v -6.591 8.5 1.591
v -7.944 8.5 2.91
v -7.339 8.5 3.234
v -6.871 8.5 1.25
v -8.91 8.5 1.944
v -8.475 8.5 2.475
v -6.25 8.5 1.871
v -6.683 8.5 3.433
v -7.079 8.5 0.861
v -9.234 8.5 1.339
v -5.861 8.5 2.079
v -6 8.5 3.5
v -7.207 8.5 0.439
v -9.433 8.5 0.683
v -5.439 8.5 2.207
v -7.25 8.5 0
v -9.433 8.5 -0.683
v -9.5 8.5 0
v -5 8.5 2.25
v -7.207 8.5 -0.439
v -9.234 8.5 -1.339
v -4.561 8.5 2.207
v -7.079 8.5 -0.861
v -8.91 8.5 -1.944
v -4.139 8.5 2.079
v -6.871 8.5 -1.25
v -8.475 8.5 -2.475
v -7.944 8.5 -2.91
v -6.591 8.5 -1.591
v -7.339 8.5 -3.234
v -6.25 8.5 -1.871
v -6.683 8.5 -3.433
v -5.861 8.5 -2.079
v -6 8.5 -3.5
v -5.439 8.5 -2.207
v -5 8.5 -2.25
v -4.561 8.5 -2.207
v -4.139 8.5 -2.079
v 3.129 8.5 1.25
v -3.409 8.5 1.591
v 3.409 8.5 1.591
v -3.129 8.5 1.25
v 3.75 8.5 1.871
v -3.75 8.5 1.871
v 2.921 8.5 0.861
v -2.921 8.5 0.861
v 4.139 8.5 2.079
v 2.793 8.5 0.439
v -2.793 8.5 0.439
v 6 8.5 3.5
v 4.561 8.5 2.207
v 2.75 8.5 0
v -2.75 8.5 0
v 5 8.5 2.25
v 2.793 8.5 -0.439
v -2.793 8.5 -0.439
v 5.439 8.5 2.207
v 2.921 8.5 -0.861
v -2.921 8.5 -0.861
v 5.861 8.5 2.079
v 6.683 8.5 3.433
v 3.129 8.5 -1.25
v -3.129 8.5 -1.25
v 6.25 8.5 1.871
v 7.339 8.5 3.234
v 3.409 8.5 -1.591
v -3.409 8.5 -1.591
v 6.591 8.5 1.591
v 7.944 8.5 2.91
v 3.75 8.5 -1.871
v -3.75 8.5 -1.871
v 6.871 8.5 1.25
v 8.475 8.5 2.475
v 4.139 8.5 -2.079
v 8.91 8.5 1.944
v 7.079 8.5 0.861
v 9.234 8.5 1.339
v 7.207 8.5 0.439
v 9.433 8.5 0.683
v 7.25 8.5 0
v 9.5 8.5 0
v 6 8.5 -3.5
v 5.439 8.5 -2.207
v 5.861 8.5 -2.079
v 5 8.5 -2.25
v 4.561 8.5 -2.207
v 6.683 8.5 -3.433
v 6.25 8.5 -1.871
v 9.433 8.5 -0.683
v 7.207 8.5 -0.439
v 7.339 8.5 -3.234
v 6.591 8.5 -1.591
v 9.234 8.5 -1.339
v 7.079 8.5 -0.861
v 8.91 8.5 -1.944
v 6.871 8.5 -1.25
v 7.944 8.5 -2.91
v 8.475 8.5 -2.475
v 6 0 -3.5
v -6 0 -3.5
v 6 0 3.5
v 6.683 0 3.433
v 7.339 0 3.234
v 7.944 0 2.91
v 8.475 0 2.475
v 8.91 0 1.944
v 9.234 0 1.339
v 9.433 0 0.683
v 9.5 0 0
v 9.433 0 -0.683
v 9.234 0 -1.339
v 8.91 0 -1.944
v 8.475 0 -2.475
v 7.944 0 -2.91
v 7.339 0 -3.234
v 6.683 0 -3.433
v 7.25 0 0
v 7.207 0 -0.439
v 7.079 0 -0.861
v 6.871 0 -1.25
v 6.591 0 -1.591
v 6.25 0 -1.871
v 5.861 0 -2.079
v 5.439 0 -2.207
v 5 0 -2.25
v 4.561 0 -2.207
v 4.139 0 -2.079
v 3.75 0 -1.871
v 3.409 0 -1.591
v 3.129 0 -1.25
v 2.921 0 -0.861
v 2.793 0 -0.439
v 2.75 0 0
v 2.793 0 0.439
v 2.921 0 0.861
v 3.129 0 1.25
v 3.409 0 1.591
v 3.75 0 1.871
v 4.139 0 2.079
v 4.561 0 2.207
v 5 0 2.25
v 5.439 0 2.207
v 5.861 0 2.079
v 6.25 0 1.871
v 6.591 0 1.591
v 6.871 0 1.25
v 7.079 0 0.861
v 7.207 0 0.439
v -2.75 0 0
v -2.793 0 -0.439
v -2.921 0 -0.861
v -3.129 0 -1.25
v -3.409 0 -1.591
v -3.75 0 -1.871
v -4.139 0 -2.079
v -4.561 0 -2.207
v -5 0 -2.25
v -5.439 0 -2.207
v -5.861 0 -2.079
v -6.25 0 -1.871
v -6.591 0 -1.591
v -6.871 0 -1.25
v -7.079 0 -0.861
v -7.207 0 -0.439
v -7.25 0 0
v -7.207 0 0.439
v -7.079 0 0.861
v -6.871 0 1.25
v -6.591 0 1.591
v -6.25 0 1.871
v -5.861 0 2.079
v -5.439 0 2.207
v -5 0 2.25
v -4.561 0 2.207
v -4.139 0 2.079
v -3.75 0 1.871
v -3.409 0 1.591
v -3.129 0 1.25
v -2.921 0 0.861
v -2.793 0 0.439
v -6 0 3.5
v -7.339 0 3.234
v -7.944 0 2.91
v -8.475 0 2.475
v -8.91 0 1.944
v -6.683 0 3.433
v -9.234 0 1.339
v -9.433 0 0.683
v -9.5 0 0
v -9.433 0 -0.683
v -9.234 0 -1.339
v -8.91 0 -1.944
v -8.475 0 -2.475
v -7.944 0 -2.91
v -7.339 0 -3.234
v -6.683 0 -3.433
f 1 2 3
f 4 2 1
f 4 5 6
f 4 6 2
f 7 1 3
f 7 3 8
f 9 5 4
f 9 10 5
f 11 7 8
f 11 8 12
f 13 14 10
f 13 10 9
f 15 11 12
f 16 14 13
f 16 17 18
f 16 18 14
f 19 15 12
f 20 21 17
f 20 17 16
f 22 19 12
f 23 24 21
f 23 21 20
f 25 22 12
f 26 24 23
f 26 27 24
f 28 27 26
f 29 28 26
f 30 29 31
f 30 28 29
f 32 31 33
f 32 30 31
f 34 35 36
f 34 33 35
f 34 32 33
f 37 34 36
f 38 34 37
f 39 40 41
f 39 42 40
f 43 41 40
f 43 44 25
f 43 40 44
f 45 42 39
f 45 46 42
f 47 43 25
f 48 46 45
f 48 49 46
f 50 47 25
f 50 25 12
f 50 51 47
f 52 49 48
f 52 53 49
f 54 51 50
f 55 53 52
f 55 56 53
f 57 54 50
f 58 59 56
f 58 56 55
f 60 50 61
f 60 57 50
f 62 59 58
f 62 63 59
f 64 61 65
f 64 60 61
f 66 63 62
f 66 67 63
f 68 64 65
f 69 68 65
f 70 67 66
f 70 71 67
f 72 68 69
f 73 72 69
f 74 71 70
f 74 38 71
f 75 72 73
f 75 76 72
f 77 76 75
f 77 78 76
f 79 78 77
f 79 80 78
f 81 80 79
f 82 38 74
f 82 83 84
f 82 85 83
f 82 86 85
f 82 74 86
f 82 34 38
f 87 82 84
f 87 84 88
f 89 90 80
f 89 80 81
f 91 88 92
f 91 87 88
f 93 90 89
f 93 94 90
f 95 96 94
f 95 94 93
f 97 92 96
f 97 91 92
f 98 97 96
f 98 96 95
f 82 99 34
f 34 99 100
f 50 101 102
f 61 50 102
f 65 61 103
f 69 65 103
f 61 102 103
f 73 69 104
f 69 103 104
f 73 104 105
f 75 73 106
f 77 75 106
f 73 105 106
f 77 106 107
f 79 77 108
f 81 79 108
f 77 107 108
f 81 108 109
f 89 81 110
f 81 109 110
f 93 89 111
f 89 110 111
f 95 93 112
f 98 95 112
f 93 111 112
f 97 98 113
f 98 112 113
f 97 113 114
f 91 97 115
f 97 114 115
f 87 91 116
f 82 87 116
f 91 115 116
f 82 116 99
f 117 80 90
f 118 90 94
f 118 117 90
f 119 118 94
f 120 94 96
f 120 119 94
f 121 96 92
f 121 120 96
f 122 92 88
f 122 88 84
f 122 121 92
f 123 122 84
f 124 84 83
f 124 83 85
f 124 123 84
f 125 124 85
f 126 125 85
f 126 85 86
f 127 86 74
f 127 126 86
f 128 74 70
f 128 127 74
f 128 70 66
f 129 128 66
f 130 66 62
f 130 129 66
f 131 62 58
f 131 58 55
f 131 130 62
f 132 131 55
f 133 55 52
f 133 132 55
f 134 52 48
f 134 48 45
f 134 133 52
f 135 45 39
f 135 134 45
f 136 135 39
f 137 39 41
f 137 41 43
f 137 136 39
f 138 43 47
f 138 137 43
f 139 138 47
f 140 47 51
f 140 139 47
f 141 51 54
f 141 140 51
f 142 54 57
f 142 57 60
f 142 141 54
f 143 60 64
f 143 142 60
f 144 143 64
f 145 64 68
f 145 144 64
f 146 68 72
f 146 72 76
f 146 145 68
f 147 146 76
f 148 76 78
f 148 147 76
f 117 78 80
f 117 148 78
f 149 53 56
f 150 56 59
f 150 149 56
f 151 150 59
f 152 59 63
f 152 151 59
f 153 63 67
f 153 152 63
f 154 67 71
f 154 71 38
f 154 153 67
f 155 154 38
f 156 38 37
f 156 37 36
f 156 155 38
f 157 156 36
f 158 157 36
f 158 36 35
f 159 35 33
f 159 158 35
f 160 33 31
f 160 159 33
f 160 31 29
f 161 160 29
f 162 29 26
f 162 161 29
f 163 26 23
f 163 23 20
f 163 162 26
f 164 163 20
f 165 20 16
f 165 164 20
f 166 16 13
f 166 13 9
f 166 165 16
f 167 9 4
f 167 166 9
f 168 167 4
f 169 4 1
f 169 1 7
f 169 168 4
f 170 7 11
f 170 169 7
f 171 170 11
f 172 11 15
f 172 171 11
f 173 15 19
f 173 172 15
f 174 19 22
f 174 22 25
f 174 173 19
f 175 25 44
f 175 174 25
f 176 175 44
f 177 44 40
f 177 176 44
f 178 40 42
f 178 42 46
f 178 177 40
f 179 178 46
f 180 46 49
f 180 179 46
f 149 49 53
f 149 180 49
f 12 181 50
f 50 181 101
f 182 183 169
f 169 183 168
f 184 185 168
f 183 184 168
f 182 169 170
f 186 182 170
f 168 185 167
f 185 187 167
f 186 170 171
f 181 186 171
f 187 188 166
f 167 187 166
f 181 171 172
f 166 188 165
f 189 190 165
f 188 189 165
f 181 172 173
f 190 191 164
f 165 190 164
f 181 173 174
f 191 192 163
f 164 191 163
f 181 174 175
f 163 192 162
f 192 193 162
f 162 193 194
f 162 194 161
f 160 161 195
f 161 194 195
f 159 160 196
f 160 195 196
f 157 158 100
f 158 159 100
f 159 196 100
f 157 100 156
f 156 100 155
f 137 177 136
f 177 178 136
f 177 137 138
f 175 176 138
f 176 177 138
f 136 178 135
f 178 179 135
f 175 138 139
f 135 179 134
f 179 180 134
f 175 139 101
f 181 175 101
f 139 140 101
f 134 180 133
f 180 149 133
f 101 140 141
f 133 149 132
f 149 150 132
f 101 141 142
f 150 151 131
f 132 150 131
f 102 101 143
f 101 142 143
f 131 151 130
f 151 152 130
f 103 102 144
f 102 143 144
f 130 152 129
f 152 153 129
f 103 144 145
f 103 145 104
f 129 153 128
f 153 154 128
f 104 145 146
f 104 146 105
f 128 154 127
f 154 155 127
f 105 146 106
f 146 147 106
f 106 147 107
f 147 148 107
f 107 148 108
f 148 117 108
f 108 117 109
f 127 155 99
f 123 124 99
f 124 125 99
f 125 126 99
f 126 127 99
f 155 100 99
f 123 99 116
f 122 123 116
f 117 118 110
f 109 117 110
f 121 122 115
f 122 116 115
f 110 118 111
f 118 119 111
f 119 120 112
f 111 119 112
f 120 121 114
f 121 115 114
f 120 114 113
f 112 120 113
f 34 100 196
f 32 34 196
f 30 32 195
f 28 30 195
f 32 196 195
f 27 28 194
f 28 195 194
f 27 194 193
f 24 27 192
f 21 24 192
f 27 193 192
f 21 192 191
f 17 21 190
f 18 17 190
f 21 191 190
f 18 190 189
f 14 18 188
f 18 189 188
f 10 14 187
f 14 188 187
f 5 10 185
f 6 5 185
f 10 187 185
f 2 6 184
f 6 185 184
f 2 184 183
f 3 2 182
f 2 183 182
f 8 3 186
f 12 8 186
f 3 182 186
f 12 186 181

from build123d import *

# Parameters (mm, degrees)
SKETCH1_R           = 2.25
BOSS_EXTRUDE1_DEPTH = 8.5


with BuildPart() as part:
    # Sketch1 → Boss-Extrude1 (new body)
    with BuildSketch(Plane(origin=(0, 0, 0), x_dir=(1, 0, 0), z_dir=(0, 1, 0))):
        with BuildLine():
            Line((-6, -3.5), (6, -3.5))
            ThreePointArc((6, -3.5), (9.5, 0), (6, 3.5))
            Line((6, 3.5), (-6, 3.5))
            ThreePointArc((-6, 3.5), (-9.5, 0), (-6, -3.5))
        make_face()
        with Locations((5, 0)):
            Circle(SKETCH1_R, mode=Mode.SUBTRACT)
        with Locations((-5, 0)):
            Circle(SKETCH1_R, mode=Mode.SUBTRACT)
    extrude(amount=BOSS_EXTRUDE1_DEPTH)


solid = part.part
